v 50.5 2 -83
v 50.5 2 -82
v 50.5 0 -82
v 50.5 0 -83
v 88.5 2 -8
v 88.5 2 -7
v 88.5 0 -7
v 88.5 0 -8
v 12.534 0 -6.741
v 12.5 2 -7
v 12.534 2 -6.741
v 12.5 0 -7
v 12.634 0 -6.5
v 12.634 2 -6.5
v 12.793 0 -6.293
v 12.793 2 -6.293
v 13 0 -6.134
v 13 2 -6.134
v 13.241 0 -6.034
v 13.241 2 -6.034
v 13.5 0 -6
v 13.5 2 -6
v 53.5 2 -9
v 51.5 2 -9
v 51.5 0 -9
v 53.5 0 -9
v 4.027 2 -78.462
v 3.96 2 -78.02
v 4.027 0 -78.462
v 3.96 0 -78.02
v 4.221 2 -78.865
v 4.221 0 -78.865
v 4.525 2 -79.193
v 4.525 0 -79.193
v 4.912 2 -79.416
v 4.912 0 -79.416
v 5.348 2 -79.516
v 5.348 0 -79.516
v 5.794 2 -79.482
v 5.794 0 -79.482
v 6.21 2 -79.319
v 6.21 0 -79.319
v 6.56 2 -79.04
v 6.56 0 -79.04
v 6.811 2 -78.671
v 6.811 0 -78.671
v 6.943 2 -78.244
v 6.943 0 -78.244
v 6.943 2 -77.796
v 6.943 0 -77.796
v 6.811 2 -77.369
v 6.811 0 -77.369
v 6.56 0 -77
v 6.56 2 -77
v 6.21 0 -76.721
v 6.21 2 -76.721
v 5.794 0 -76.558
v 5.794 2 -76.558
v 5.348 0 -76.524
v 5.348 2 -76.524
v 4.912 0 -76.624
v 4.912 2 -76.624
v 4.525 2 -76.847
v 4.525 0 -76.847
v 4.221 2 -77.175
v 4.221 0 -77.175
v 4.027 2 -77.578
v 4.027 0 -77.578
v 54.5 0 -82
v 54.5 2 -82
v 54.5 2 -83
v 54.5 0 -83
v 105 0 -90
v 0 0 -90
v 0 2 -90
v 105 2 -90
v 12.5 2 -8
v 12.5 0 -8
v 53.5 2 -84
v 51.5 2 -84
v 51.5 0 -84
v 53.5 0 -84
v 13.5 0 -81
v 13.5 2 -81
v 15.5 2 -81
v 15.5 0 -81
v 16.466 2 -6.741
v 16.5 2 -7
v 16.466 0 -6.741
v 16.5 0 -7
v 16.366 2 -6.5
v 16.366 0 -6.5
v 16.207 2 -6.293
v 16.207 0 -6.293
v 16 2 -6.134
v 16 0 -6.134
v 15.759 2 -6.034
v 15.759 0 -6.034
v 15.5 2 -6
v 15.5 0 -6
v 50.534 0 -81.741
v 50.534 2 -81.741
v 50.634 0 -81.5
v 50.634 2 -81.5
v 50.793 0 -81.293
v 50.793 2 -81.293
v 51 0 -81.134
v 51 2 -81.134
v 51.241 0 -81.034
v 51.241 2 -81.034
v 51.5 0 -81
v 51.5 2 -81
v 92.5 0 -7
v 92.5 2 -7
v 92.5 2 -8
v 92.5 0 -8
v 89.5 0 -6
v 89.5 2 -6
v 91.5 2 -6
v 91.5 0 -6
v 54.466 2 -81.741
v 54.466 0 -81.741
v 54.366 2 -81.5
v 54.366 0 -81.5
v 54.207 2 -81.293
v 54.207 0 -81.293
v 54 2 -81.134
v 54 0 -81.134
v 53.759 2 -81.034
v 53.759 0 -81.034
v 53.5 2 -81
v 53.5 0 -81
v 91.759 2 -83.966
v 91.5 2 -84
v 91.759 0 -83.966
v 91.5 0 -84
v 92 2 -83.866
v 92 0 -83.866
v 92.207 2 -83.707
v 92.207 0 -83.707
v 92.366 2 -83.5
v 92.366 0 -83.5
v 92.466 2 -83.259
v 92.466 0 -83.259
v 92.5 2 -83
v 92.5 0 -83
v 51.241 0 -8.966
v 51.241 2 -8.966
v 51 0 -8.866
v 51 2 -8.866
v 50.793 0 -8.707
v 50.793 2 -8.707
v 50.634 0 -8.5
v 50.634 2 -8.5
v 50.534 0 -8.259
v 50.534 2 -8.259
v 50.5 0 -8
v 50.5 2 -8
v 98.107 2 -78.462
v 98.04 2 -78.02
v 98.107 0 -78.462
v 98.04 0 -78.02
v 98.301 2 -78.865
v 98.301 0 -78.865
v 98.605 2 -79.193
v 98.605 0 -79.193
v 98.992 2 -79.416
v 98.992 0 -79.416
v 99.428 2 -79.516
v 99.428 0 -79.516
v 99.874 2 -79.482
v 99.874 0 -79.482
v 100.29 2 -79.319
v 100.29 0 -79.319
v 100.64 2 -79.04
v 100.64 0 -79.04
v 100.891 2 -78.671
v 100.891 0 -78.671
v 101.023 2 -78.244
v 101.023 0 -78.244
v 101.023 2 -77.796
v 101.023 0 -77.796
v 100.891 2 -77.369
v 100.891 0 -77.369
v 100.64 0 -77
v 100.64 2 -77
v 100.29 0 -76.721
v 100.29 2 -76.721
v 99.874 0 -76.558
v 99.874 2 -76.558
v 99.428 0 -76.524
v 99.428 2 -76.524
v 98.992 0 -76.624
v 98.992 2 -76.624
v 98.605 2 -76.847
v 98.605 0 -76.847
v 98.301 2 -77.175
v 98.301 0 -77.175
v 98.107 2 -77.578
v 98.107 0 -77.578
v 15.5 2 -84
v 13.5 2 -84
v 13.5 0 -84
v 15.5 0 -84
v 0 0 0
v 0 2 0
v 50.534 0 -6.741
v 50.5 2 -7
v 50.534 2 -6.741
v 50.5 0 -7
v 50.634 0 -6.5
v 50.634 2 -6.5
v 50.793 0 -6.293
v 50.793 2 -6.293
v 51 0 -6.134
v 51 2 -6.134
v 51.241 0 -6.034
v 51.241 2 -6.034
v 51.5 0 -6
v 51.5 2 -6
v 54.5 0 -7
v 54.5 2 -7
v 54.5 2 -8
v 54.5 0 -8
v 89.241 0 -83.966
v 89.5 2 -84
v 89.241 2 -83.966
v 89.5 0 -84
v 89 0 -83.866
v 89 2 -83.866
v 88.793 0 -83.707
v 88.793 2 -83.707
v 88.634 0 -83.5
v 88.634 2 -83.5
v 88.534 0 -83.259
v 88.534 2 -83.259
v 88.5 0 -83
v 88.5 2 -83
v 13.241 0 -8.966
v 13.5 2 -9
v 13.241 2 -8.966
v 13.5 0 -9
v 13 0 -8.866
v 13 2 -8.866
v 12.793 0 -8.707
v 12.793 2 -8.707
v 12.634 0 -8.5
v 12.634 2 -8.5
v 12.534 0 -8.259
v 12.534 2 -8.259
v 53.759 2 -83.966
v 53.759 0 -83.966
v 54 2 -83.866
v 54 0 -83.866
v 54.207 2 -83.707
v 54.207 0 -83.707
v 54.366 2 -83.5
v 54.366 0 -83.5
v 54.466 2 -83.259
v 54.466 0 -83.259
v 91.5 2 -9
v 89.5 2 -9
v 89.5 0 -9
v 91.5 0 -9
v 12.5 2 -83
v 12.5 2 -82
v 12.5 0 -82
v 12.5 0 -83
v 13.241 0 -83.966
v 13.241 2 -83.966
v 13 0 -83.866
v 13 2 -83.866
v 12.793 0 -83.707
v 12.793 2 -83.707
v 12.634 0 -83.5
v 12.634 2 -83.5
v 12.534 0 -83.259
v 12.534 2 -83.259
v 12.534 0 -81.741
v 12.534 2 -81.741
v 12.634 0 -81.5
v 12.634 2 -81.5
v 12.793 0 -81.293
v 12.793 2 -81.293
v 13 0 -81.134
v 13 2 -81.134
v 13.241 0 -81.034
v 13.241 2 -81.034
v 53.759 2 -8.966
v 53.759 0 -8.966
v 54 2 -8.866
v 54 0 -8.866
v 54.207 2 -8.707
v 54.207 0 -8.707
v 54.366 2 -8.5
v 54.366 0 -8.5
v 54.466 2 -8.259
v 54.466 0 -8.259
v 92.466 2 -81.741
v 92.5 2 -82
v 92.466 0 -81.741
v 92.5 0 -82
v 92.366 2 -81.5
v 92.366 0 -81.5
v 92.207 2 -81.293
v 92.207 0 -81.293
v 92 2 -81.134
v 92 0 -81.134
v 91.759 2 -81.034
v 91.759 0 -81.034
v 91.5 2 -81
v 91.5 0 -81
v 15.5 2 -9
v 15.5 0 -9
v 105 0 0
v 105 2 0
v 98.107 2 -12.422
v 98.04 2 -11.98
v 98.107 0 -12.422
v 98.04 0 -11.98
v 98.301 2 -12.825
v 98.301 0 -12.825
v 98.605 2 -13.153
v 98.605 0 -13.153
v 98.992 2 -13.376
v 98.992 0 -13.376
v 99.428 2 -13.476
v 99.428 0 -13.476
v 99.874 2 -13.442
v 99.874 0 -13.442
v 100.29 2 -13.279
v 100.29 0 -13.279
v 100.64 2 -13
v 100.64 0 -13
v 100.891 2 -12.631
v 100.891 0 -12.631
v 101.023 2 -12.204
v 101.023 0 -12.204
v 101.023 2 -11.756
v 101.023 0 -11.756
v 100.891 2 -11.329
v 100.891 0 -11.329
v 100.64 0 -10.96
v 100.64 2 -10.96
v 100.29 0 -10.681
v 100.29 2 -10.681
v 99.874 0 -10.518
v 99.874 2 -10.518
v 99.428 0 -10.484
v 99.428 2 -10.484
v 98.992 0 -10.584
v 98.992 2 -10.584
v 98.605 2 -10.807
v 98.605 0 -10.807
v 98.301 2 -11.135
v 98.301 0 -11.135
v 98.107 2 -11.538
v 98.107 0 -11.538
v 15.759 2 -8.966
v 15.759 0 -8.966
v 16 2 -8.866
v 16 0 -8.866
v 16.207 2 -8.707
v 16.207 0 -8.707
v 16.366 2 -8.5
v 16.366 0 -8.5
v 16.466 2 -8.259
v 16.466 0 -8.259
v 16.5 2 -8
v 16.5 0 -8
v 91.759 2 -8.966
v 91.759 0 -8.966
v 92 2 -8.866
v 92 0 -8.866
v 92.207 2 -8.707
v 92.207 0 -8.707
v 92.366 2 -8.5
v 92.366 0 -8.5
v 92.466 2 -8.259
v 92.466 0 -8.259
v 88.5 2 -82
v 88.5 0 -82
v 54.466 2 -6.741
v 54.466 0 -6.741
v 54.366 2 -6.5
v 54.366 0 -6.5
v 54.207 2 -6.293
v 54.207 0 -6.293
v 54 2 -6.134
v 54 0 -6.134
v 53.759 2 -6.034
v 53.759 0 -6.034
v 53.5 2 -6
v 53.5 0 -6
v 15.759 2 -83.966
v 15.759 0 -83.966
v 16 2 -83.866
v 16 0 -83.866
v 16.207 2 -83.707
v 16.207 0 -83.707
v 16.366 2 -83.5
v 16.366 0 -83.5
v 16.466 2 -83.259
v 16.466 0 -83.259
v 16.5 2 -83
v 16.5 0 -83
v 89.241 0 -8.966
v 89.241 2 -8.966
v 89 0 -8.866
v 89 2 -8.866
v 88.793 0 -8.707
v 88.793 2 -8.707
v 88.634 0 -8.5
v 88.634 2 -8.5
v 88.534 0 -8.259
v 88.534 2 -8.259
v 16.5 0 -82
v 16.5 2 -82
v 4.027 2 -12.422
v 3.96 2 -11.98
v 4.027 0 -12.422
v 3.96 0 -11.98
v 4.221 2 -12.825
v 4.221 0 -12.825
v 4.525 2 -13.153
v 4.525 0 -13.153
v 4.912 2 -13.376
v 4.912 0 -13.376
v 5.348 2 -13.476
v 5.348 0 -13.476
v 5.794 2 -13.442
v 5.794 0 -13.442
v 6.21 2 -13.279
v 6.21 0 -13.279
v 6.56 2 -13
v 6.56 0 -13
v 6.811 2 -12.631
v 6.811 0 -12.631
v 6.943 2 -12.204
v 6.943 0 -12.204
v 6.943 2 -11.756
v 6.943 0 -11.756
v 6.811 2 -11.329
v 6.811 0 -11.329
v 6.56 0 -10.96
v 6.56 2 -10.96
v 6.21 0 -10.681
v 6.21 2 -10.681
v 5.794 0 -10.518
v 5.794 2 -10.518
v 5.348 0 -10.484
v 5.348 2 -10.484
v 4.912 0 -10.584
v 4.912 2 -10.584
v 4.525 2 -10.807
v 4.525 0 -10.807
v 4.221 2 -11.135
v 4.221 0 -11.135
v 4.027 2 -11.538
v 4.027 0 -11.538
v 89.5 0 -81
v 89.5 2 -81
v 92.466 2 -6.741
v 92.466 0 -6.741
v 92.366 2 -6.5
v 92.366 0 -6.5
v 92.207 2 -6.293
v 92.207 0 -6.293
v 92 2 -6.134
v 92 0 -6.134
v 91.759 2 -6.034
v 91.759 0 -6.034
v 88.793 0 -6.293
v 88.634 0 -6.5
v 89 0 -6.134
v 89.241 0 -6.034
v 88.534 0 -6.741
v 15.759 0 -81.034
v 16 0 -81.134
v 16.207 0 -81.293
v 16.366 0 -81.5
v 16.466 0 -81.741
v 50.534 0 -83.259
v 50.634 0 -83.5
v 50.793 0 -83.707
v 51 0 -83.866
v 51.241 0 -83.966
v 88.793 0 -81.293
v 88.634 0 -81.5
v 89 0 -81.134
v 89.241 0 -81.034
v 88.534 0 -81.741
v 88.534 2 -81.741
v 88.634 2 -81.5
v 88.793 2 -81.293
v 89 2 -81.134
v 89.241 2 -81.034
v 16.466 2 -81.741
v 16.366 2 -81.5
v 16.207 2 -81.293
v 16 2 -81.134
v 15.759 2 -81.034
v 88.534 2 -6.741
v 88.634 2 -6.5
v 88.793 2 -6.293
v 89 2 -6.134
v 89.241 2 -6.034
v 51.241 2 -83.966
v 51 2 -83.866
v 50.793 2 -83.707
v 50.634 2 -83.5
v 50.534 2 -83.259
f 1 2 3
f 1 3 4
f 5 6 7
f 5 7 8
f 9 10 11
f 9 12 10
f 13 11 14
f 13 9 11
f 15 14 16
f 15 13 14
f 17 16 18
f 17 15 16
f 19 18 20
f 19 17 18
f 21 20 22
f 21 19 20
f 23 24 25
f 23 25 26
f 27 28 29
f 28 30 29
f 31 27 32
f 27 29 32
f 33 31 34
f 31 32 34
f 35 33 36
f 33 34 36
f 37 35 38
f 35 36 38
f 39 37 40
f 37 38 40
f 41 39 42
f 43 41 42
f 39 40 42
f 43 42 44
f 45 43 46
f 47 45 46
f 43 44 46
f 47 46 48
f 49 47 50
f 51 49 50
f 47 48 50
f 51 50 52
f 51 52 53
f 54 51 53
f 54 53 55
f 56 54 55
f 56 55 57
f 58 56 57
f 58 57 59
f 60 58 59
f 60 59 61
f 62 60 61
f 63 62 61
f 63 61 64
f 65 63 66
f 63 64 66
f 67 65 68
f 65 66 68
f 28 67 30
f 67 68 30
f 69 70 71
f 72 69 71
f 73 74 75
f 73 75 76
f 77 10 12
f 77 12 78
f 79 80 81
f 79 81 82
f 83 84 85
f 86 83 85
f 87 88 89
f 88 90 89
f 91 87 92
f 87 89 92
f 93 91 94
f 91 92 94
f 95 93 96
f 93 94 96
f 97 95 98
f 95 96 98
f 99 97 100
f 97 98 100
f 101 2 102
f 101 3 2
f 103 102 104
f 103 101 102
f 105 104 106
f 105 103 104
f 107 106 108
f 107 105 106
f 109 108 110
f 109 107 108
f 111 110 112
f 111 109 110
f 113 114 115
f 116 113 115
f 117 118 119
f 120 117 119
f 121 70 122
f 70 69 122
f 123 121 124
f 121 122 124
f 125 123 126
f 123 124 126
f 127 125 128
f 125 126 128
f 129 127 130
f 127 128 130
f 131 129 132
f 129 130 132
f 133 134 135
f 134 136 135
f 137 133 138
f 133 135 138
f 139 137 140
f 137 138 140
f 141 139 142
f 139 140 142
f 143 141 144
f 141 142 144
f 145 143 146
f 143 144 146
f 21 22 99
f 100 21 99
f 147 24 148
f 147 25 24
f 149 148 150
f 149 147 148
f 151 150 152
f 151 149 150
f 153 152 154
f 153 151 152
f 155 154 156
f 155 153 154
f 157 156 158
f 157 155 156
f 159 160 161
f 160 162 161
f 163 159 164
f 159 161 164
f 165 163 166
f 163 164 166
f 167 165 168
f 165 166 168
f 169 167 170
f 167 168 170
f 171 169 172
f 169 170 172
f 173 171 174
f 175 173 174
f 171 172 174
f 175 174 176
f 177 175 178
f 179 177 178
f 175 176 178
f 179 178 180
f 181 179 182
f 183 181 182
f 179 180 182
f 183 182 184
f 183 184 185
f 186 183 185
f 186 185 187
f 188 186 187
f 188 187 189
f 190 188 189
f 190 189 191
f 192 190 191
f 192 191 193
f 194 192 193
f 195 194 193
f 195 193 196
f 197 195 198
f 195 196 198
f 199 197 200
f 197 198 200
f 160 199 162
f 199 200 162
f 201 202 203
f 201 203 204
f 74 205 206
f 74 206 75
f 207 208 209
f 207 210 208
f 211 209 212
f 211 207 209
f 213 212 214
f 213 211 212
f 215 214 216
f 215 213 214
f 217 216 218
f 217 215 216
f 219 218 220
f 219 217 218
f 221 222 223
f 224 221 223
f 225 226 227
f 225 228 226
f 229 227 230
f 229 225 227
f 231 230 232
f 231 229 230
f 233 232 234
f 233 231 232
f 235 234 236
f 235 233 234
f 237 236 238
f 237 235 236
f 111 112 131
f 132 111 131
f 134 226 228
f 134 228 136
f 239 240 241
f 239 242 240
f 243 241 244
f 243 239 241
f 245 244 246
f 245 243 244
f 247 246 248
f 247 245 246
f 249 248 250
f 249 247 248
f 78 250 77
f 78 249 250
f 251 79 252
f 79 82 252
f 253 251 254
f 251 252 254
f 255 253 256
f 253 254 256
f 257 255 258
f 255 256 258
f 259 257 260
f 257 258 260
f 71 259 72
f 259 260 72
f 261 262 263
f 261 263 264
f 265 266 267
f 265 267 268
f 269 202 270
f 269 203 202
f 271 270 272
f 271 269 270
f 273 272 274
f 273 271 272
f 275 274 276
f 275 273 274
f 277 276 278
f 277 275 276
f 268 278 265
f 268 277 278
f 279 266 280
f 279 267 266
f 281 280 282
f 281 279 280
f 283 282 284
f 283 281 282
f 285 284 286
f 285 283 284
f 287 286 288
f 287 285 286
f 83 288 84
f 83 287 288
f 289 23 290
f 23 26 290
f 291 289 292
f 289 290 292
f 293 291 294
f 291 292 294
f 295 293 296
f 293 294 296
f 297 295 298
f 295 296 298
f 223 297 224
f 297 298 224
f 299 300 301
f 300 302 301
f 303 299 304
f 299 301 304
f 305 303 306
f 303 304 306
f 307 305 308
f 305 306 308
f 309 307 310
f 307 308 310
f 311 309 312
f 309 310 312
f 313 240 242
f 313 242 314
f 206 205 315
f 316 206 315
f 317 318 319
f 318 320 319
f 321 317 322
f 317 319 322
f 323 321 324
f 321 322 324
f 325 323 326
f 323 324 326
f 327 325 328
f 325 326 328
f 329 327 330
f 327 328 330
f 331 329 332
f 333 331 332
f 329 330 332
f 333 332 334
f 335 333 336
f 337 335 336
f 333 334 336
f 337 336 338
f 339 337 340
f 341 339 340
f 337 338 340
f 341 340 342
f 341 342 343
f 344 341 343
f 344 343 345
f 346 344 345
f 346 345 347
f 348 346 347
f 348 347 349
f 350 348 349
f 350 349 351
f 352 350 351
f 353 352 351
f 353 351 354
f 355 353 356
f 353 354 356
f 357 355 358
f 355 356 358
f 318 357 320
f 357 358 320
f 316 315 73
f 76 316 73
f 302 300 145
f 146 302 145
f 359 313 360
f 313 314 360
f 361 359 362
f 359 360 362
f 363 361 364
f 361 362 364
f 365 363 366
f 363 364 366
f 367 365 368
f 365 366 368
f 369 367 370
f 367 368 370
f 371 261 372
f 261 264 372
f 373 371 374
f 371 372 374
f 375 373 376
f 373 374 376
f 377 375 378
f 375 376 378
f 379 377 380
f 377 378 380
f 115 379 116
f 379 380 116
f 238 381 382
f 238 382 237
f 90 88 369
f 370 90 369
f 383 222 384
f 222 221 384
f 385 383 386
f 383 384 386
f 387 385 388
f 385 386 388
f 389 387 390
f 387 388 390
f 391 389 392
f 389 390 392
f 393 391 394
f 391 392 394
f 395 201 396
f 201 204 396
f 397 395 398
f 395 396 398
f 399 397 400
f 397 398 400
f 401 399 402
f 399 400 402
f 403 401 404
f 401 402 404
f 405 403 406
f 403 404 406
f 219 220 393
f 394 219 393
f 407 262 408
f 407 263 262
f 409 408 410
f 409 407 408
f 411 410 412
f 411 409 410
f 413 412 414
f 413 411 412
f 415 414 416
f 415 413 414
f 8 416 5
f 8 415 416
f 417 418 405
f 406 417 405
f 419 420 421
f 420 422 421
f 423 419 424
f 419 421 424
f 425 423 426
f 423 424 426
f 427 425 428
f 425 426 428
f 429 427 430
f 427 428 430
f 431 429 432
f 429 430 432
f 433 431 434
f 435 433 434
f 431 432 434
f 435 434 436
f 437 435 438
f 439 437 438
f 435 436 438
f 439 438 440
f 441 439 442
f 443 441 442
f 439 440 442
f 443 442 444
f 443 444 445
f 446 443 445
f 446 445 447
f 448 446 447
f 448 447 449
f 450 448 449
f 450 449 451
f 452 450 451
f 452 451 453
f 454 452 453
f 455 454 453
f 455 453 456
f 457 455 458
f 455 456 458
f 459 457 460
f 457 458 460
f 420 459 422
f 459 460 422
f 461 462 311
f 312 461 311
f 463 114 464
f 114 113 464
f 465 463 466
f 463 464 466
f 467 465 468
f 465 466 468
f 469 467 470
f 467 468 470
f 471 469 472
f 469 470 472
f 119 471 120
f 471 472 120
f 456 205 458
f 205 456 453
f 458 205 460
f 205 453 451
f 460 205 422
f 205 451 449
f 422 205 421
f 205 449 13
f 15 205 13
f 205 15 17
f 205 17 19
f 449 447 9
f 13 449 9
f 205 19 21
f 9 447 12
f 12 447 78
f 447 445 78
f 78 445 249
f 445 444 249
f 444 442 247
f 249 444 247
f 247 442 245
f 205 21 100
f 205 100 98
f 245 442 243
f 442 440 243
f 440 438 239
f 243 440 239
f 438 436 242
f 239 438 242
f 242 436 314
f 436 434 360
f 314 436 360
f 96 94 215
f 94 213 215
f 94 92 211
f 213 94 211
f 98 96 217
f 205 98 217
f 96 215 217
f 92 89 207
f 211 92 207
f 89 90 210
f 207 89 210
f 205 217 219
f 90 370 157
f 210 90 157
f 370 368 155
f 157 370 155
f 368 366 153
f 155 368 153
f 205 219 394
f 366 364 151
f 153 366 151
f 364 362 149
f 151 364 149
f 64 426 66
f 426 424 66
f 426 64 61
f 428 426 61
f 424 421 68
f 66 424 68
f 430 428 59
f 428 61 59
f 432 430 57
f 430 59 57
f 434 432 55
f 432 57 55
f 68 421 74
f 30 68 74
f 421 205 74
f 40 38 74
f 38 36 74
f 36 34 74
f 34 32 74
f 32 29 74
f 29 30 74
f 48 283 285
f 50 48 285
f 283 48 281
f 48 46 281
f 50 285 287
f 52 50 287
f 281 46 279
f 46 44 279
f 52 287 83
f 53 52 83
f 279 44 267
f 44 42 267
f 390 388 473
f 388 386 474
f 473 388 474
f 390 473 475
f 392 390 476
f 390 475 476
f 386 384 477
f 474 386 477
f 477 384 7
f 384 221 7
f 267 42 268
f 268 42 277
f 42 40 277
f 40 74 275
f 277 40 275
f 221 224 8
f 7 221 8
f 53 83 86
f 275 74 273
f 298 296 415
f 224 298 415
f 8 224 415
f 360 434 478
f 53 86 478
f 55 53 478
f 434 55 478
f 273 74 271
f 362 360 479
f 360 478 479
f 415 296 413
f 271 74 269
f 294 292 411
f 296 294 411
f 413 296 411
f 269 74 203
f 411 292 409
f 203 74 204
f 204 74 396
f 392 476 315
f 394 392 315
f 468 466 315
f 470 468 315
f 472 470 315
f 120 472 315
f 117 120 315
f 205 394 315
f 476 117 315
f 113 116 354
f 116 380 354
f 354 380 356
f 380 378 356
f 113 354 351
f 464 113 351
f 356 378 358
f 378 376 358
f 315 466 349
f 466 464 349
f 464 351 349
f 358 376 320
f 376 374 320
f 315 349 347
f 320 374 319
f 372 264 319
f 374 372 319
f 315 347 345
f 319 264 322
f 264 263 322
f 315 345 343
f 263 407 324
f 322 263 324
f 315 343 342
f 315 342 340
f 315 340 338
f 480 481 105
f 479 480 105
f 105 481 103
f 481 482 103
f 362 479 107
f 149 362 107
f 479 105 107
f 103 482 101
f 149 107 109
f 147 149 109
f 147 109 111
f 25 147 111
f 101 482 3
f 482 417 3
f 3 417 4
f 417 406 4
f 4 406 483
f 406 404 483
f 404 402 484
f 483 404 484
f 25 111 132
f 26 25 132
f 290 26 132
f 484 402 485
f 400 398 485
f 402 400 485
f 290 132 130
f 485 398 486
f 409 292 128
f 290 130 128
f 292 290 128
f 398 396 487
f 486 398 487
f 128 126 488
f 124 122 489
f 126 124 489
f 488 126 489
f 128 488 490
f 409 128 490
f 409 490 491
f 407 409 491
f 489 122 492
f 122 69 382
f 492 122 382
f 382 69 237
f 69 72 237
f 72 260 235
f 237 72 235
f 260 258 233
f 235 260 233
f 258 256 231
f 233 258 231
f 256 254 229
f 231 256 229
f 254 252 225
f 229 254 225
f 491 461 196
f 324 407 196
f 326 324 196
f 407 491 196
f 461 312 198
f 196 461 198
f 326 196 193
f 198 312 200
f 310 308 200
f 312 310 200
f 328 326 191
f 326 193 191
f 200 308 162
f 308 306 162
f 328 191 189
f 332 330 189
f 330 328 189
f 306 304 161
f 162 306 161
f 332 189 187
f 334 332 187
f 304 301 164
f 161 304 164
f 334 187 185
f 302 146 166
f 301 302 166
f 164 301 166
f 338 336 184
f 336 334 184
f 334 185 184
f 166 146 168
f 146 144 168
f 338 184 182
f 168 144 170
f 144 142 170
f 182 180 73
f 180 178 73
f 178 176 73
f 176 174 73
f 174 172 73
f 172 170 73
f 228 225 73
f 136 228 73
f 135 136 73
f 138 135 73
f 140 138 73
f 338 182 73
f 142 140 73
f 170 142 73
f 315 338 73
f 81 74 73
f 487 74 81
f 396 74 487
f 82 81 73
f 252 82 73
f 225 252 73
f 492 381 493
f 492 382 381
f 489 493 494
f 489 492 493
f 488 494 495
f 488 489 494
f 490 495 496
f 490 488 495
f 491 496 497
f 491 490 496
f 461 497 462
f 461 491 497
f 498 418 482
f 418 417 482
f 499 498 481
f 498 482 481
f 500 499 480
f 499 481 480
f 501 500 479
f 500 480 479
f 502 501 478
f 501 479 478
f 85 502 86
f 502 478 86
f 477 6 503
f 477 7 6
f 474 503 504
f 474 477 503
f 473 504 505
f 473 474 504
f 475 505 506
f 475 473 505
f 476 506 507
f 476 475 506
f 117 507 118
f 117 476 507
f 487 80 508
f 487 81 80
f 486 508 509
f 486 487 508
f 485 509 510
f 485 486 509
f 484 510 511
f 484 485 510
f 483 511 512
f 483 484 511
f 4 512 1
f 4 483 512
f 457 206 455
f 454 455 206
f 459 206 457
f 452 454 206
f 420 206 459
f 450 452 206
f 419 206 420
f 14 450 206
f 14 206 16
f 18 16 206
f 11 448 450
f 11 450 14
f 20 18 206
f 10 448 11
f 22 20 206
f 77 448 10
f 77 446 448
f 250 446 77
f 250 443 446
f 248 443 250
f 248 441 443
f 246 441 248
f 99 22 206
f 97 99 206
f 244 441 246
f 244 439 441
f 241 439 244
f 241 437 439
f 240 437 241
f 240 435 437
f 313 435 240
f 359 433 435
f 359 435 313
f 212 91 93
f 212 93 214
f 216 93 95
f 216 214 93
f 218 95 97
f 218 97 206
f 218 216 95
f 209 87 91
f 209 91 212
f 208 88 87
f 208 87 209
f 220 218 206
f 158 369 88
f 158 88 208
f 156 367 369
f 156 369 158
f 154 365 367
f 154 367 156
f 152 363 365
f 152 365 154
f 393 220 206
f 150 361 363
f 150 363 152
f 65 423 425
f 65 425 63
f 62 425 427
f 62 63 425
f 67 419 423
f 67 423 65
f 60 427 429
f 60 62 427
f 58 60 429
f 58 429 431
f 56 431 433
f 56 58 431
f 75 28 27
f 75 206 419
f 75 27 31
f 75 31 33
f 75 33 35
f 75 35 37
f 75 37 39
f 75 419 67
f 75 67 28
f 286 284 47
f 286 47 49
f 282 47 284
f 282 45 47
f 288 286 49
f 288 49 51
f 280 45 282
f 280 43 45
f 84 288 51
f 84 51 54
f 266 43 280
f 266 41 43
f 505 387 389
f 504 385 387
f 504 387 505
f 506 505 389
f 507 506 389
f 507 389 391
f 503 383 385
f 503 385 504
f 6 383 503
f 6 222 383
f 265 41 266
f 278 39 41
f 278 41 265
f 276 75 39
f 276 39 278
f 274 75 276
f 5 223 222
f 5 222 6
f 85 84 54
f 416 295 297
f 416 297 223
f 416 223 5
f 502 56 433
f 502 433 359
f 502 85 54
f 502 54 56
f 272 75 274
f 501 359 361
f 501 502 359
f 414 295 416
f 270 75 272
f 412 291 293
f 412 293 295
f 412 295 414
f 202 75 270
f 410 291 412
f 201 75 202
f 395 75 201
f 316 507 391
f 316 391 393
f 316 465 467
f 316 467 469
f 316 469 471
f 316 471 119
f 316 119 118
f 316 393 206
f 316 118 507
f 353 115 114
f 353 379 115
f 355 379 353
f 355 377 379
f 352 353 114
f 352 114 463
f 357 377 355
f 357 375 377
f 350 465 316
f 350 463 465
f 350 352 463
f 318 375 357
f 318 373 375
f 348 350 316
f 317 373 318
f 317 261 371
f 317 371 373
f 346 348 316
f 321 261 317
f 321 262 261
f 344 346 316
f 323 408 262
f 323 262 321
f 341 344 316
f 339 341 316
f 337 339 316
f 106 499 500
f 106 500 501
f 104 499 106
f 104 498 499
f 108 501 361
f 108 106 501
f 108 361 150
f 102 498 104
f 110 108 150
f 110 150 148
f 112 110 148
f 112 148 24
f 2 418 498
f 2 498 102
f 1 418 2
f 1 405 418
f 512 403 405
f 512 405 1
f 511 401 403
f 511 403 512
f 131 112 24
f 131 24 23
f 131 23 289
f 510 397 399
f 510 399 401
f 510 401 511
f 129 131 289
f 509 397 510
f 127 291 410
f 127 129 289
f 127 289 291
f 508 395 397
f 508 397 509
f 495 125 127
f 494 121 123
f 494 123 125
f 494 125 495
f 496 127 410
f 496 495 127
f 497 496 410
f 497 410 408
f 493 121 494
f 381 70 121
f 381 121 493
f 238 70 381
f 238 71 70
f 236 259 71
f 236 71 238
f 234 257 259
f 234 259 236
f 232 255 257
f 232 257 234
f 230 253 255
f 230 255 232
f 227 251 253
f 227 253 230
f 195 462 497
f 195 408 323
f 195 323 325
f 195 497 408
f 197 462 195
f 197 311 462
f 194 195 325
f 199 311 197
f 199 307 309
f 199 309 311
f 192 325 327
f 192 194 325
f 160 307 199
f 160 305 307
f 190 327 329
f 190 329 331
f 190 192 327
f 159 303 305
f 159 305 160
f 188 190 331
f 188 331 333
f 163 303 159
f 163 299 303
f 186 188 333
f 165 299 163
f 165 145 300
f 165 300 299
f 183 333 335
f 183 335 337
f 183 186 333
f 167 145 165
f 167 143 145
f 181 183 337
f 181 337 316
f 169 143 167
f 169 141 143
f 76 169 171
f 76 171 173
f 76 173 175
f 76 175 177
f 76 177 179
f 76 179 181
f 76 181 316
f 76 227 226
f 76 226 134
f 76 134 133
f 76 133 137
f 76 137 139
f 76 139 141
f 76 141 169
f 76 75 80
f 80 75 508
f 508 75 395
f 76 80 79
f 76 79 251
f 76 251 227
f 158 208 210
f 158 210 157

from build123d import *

# Parameters (mm, degrees)
SKETCH1_W                = 105
SKETCH1_H                = 90
BOSS_EXTRUDE1_DEPTH      = 2
M3_CLEARANCE_HOLE1_D     = 3
M3_CLEARANCE_HOLE1_DEPTH = 2
M3_CLEARANCE_HOLE1_TIP   = 0.901290929
SKETCH4_W                = 4
SKETCH4_H                = 3
CUT_EXTRUDE1_DEPTH       = 139.307628134
FILLET1_R                = 1
FILLET2_R                = 1
FILLET3_R                = 1
FILLET4_R                = 1
LPATTERN1_COUNT          = 2
LPATTERN1_PITCH          = 75
LPATTERN1_COUNT_DIR2     = 3
LPATTERN1_PITCH_DIR2     = 38
FILLET1_OF_LPATTERN1_R   = 1
FILLET2_OF_LPATTERN1_R   = 1
FILLET3_OF_LPATTERN1_R   = 1
FILLET4_OF_LPATTERN1_R   = 1


with BuildPart() as part:
    # Sketch1 → Boss-Extrude1 (new body)
    with BuildSketch(Plane(origin=(0, 0, 0), x_dir=(1, 0, 0), z_dir=(0, 1, 0))):
        with Locations((52.5, 45)):
            Rectangle(SKETCH1_W, SKETCH1_H)
    extrude(amount=BOSS_EXTRUDE1_DEPTH)

    # M3 Clearance Hole1
    with Locations(Plane(origin=(0, 2, 0), x_dir=(1, 0, 0), z_dir=(0, 1, 0))):
        with Locations((5.46, 11.98), (5.46, 78.02), (99.54, 78.02), (99.54, 11.98)):
            Hole(M3_CLEARANCE_HOLE1_D / 2, depth=M3_CLEARANCE_HOLE1_DEPTH)
            with Locations((0, 0, -(M3_CLEARANCE_HOLE1_DEPTH + M3_CLEARANCE_HOLE1_TIP / 2))):  # 118° drill point
                Cone(0, M3_CLEARANCE_HOLE1_D / 2, M3_CLEARANCE_HOLE1_TIP, mode=Mode.SUBTRACT)

    # Sketch4 → Cut-Extrude1 (cut, through all)
    with BuildSketch(Plane(origin=(0, 2, 0), x_dir=(1, 0, 0), z_dir=(0, 1, 0))):
        with Locations((14.5, 82.5)):
            Rectangle(SKETCH4_W, SKETCH4_H)
    cut_extrude1 = extrude(amount=-CUT_EXTRUDE1_DEPTH, mode=Mode.SUBTRACT)

    # Fillet1
    fillet1_edges = [part.edges().sort_by_distance(p)[0] for p in [
        (12.5, 1, -84),
    ]]
    fillet(fillet1_edges, radius=FILLET1_R)

    # Fillet2
    fillet2_edges = [part.edges().sort_by_distance(p)[0] for p in [
        (12.5, 1, -81),
    ]]
    fillet(fillet2_edges, radius=FILLET2_R)

    # Fillet3
    fillet3_edges = [part.edges().sort_by_distance(p)[0] for p in [
        (16.5, 1, -84),
    ]]
    fillet(fillet3_edges, radius=FILLET3_R)

    # Fillet4
    fillet4_edges = [part.edges().sort_by_distance(p)[0] for p in [
        (16.5, 1, -81),
    ]]
    fillet(fillet4_edges, radius=FILLET4_R)

    # LPattern1: Cut-Extrude1 2 × 3
    with Locations(*[(j * LPATTERN1_PITCH_DIR2, 0, i * LPATTERN1_PITCH) for i in range(LPATTERN1_COUNT) for j in range(LPATTERN1_COUNT_DIR2) if (i, j) != (0, 0)]):
        add(cut_extrude1, mode=Mode.SUBTRACT)

    # Fillet1 of LPattern1
    fillet1_of_lpattern1_edges = [part.edges().sort_by_distance(p)[0] for p in [
        (50.5, 1, -84),
        (88.5, 1, -84),
        (12.5, 1, -9),
        (50.5, 1, -9),
        (88.5, 1, -9),
    ]]
    fillet(fillet1_of_lpattern1_edges, radius=FILLET1_OF_LPATTERN1_R)

    # Fillet2 of LPattern1
    fillet2_of_lpattern1_edges = [part.edges().sort_by_distance(p)[0] for p in [
        (50.5, 1, -81),
        (88.5, 1, -81),
        (12.5, 1, -6),
        (50.5, 1, -6),
        (88.5, 1, -6),
    ]]
    fillet(fillet2_of_lpattern1_edges, radius=FILLET2_OF_LPATTERN1_R)

    # Fillet3 of LPattern1
    fillet3_of_lpattern1_edges = [part.edges().sort_by_distance(p)[0] for p in [
        (54.5, 1, -84),
        (92.5, 1, -84),
        (16.5, 1, -9),
        (54.5, 1, -9),
        (92.5, 1, -9),
    ]]
    fillet(fillet3_of_lpattern1_edges, radius=FILLET3_OF_LPATTERN1_R)

    # Fillet4 of LPattern1
    fillet4_of_lpattern1_edges = [part.edges().sort_by_distance(p)[0] for p in [
        (54.5, 1, -81),
        (92.5, 1, -81),
        (16.5, 1, -6),
        (54.5, 1, -6),
        (92.5, 1, -6),
    ]]
    fillet(fillet4_of_lpattern1_edges, radius=FILLET4_OF_LPATTERN1_R)


solid = part.part
